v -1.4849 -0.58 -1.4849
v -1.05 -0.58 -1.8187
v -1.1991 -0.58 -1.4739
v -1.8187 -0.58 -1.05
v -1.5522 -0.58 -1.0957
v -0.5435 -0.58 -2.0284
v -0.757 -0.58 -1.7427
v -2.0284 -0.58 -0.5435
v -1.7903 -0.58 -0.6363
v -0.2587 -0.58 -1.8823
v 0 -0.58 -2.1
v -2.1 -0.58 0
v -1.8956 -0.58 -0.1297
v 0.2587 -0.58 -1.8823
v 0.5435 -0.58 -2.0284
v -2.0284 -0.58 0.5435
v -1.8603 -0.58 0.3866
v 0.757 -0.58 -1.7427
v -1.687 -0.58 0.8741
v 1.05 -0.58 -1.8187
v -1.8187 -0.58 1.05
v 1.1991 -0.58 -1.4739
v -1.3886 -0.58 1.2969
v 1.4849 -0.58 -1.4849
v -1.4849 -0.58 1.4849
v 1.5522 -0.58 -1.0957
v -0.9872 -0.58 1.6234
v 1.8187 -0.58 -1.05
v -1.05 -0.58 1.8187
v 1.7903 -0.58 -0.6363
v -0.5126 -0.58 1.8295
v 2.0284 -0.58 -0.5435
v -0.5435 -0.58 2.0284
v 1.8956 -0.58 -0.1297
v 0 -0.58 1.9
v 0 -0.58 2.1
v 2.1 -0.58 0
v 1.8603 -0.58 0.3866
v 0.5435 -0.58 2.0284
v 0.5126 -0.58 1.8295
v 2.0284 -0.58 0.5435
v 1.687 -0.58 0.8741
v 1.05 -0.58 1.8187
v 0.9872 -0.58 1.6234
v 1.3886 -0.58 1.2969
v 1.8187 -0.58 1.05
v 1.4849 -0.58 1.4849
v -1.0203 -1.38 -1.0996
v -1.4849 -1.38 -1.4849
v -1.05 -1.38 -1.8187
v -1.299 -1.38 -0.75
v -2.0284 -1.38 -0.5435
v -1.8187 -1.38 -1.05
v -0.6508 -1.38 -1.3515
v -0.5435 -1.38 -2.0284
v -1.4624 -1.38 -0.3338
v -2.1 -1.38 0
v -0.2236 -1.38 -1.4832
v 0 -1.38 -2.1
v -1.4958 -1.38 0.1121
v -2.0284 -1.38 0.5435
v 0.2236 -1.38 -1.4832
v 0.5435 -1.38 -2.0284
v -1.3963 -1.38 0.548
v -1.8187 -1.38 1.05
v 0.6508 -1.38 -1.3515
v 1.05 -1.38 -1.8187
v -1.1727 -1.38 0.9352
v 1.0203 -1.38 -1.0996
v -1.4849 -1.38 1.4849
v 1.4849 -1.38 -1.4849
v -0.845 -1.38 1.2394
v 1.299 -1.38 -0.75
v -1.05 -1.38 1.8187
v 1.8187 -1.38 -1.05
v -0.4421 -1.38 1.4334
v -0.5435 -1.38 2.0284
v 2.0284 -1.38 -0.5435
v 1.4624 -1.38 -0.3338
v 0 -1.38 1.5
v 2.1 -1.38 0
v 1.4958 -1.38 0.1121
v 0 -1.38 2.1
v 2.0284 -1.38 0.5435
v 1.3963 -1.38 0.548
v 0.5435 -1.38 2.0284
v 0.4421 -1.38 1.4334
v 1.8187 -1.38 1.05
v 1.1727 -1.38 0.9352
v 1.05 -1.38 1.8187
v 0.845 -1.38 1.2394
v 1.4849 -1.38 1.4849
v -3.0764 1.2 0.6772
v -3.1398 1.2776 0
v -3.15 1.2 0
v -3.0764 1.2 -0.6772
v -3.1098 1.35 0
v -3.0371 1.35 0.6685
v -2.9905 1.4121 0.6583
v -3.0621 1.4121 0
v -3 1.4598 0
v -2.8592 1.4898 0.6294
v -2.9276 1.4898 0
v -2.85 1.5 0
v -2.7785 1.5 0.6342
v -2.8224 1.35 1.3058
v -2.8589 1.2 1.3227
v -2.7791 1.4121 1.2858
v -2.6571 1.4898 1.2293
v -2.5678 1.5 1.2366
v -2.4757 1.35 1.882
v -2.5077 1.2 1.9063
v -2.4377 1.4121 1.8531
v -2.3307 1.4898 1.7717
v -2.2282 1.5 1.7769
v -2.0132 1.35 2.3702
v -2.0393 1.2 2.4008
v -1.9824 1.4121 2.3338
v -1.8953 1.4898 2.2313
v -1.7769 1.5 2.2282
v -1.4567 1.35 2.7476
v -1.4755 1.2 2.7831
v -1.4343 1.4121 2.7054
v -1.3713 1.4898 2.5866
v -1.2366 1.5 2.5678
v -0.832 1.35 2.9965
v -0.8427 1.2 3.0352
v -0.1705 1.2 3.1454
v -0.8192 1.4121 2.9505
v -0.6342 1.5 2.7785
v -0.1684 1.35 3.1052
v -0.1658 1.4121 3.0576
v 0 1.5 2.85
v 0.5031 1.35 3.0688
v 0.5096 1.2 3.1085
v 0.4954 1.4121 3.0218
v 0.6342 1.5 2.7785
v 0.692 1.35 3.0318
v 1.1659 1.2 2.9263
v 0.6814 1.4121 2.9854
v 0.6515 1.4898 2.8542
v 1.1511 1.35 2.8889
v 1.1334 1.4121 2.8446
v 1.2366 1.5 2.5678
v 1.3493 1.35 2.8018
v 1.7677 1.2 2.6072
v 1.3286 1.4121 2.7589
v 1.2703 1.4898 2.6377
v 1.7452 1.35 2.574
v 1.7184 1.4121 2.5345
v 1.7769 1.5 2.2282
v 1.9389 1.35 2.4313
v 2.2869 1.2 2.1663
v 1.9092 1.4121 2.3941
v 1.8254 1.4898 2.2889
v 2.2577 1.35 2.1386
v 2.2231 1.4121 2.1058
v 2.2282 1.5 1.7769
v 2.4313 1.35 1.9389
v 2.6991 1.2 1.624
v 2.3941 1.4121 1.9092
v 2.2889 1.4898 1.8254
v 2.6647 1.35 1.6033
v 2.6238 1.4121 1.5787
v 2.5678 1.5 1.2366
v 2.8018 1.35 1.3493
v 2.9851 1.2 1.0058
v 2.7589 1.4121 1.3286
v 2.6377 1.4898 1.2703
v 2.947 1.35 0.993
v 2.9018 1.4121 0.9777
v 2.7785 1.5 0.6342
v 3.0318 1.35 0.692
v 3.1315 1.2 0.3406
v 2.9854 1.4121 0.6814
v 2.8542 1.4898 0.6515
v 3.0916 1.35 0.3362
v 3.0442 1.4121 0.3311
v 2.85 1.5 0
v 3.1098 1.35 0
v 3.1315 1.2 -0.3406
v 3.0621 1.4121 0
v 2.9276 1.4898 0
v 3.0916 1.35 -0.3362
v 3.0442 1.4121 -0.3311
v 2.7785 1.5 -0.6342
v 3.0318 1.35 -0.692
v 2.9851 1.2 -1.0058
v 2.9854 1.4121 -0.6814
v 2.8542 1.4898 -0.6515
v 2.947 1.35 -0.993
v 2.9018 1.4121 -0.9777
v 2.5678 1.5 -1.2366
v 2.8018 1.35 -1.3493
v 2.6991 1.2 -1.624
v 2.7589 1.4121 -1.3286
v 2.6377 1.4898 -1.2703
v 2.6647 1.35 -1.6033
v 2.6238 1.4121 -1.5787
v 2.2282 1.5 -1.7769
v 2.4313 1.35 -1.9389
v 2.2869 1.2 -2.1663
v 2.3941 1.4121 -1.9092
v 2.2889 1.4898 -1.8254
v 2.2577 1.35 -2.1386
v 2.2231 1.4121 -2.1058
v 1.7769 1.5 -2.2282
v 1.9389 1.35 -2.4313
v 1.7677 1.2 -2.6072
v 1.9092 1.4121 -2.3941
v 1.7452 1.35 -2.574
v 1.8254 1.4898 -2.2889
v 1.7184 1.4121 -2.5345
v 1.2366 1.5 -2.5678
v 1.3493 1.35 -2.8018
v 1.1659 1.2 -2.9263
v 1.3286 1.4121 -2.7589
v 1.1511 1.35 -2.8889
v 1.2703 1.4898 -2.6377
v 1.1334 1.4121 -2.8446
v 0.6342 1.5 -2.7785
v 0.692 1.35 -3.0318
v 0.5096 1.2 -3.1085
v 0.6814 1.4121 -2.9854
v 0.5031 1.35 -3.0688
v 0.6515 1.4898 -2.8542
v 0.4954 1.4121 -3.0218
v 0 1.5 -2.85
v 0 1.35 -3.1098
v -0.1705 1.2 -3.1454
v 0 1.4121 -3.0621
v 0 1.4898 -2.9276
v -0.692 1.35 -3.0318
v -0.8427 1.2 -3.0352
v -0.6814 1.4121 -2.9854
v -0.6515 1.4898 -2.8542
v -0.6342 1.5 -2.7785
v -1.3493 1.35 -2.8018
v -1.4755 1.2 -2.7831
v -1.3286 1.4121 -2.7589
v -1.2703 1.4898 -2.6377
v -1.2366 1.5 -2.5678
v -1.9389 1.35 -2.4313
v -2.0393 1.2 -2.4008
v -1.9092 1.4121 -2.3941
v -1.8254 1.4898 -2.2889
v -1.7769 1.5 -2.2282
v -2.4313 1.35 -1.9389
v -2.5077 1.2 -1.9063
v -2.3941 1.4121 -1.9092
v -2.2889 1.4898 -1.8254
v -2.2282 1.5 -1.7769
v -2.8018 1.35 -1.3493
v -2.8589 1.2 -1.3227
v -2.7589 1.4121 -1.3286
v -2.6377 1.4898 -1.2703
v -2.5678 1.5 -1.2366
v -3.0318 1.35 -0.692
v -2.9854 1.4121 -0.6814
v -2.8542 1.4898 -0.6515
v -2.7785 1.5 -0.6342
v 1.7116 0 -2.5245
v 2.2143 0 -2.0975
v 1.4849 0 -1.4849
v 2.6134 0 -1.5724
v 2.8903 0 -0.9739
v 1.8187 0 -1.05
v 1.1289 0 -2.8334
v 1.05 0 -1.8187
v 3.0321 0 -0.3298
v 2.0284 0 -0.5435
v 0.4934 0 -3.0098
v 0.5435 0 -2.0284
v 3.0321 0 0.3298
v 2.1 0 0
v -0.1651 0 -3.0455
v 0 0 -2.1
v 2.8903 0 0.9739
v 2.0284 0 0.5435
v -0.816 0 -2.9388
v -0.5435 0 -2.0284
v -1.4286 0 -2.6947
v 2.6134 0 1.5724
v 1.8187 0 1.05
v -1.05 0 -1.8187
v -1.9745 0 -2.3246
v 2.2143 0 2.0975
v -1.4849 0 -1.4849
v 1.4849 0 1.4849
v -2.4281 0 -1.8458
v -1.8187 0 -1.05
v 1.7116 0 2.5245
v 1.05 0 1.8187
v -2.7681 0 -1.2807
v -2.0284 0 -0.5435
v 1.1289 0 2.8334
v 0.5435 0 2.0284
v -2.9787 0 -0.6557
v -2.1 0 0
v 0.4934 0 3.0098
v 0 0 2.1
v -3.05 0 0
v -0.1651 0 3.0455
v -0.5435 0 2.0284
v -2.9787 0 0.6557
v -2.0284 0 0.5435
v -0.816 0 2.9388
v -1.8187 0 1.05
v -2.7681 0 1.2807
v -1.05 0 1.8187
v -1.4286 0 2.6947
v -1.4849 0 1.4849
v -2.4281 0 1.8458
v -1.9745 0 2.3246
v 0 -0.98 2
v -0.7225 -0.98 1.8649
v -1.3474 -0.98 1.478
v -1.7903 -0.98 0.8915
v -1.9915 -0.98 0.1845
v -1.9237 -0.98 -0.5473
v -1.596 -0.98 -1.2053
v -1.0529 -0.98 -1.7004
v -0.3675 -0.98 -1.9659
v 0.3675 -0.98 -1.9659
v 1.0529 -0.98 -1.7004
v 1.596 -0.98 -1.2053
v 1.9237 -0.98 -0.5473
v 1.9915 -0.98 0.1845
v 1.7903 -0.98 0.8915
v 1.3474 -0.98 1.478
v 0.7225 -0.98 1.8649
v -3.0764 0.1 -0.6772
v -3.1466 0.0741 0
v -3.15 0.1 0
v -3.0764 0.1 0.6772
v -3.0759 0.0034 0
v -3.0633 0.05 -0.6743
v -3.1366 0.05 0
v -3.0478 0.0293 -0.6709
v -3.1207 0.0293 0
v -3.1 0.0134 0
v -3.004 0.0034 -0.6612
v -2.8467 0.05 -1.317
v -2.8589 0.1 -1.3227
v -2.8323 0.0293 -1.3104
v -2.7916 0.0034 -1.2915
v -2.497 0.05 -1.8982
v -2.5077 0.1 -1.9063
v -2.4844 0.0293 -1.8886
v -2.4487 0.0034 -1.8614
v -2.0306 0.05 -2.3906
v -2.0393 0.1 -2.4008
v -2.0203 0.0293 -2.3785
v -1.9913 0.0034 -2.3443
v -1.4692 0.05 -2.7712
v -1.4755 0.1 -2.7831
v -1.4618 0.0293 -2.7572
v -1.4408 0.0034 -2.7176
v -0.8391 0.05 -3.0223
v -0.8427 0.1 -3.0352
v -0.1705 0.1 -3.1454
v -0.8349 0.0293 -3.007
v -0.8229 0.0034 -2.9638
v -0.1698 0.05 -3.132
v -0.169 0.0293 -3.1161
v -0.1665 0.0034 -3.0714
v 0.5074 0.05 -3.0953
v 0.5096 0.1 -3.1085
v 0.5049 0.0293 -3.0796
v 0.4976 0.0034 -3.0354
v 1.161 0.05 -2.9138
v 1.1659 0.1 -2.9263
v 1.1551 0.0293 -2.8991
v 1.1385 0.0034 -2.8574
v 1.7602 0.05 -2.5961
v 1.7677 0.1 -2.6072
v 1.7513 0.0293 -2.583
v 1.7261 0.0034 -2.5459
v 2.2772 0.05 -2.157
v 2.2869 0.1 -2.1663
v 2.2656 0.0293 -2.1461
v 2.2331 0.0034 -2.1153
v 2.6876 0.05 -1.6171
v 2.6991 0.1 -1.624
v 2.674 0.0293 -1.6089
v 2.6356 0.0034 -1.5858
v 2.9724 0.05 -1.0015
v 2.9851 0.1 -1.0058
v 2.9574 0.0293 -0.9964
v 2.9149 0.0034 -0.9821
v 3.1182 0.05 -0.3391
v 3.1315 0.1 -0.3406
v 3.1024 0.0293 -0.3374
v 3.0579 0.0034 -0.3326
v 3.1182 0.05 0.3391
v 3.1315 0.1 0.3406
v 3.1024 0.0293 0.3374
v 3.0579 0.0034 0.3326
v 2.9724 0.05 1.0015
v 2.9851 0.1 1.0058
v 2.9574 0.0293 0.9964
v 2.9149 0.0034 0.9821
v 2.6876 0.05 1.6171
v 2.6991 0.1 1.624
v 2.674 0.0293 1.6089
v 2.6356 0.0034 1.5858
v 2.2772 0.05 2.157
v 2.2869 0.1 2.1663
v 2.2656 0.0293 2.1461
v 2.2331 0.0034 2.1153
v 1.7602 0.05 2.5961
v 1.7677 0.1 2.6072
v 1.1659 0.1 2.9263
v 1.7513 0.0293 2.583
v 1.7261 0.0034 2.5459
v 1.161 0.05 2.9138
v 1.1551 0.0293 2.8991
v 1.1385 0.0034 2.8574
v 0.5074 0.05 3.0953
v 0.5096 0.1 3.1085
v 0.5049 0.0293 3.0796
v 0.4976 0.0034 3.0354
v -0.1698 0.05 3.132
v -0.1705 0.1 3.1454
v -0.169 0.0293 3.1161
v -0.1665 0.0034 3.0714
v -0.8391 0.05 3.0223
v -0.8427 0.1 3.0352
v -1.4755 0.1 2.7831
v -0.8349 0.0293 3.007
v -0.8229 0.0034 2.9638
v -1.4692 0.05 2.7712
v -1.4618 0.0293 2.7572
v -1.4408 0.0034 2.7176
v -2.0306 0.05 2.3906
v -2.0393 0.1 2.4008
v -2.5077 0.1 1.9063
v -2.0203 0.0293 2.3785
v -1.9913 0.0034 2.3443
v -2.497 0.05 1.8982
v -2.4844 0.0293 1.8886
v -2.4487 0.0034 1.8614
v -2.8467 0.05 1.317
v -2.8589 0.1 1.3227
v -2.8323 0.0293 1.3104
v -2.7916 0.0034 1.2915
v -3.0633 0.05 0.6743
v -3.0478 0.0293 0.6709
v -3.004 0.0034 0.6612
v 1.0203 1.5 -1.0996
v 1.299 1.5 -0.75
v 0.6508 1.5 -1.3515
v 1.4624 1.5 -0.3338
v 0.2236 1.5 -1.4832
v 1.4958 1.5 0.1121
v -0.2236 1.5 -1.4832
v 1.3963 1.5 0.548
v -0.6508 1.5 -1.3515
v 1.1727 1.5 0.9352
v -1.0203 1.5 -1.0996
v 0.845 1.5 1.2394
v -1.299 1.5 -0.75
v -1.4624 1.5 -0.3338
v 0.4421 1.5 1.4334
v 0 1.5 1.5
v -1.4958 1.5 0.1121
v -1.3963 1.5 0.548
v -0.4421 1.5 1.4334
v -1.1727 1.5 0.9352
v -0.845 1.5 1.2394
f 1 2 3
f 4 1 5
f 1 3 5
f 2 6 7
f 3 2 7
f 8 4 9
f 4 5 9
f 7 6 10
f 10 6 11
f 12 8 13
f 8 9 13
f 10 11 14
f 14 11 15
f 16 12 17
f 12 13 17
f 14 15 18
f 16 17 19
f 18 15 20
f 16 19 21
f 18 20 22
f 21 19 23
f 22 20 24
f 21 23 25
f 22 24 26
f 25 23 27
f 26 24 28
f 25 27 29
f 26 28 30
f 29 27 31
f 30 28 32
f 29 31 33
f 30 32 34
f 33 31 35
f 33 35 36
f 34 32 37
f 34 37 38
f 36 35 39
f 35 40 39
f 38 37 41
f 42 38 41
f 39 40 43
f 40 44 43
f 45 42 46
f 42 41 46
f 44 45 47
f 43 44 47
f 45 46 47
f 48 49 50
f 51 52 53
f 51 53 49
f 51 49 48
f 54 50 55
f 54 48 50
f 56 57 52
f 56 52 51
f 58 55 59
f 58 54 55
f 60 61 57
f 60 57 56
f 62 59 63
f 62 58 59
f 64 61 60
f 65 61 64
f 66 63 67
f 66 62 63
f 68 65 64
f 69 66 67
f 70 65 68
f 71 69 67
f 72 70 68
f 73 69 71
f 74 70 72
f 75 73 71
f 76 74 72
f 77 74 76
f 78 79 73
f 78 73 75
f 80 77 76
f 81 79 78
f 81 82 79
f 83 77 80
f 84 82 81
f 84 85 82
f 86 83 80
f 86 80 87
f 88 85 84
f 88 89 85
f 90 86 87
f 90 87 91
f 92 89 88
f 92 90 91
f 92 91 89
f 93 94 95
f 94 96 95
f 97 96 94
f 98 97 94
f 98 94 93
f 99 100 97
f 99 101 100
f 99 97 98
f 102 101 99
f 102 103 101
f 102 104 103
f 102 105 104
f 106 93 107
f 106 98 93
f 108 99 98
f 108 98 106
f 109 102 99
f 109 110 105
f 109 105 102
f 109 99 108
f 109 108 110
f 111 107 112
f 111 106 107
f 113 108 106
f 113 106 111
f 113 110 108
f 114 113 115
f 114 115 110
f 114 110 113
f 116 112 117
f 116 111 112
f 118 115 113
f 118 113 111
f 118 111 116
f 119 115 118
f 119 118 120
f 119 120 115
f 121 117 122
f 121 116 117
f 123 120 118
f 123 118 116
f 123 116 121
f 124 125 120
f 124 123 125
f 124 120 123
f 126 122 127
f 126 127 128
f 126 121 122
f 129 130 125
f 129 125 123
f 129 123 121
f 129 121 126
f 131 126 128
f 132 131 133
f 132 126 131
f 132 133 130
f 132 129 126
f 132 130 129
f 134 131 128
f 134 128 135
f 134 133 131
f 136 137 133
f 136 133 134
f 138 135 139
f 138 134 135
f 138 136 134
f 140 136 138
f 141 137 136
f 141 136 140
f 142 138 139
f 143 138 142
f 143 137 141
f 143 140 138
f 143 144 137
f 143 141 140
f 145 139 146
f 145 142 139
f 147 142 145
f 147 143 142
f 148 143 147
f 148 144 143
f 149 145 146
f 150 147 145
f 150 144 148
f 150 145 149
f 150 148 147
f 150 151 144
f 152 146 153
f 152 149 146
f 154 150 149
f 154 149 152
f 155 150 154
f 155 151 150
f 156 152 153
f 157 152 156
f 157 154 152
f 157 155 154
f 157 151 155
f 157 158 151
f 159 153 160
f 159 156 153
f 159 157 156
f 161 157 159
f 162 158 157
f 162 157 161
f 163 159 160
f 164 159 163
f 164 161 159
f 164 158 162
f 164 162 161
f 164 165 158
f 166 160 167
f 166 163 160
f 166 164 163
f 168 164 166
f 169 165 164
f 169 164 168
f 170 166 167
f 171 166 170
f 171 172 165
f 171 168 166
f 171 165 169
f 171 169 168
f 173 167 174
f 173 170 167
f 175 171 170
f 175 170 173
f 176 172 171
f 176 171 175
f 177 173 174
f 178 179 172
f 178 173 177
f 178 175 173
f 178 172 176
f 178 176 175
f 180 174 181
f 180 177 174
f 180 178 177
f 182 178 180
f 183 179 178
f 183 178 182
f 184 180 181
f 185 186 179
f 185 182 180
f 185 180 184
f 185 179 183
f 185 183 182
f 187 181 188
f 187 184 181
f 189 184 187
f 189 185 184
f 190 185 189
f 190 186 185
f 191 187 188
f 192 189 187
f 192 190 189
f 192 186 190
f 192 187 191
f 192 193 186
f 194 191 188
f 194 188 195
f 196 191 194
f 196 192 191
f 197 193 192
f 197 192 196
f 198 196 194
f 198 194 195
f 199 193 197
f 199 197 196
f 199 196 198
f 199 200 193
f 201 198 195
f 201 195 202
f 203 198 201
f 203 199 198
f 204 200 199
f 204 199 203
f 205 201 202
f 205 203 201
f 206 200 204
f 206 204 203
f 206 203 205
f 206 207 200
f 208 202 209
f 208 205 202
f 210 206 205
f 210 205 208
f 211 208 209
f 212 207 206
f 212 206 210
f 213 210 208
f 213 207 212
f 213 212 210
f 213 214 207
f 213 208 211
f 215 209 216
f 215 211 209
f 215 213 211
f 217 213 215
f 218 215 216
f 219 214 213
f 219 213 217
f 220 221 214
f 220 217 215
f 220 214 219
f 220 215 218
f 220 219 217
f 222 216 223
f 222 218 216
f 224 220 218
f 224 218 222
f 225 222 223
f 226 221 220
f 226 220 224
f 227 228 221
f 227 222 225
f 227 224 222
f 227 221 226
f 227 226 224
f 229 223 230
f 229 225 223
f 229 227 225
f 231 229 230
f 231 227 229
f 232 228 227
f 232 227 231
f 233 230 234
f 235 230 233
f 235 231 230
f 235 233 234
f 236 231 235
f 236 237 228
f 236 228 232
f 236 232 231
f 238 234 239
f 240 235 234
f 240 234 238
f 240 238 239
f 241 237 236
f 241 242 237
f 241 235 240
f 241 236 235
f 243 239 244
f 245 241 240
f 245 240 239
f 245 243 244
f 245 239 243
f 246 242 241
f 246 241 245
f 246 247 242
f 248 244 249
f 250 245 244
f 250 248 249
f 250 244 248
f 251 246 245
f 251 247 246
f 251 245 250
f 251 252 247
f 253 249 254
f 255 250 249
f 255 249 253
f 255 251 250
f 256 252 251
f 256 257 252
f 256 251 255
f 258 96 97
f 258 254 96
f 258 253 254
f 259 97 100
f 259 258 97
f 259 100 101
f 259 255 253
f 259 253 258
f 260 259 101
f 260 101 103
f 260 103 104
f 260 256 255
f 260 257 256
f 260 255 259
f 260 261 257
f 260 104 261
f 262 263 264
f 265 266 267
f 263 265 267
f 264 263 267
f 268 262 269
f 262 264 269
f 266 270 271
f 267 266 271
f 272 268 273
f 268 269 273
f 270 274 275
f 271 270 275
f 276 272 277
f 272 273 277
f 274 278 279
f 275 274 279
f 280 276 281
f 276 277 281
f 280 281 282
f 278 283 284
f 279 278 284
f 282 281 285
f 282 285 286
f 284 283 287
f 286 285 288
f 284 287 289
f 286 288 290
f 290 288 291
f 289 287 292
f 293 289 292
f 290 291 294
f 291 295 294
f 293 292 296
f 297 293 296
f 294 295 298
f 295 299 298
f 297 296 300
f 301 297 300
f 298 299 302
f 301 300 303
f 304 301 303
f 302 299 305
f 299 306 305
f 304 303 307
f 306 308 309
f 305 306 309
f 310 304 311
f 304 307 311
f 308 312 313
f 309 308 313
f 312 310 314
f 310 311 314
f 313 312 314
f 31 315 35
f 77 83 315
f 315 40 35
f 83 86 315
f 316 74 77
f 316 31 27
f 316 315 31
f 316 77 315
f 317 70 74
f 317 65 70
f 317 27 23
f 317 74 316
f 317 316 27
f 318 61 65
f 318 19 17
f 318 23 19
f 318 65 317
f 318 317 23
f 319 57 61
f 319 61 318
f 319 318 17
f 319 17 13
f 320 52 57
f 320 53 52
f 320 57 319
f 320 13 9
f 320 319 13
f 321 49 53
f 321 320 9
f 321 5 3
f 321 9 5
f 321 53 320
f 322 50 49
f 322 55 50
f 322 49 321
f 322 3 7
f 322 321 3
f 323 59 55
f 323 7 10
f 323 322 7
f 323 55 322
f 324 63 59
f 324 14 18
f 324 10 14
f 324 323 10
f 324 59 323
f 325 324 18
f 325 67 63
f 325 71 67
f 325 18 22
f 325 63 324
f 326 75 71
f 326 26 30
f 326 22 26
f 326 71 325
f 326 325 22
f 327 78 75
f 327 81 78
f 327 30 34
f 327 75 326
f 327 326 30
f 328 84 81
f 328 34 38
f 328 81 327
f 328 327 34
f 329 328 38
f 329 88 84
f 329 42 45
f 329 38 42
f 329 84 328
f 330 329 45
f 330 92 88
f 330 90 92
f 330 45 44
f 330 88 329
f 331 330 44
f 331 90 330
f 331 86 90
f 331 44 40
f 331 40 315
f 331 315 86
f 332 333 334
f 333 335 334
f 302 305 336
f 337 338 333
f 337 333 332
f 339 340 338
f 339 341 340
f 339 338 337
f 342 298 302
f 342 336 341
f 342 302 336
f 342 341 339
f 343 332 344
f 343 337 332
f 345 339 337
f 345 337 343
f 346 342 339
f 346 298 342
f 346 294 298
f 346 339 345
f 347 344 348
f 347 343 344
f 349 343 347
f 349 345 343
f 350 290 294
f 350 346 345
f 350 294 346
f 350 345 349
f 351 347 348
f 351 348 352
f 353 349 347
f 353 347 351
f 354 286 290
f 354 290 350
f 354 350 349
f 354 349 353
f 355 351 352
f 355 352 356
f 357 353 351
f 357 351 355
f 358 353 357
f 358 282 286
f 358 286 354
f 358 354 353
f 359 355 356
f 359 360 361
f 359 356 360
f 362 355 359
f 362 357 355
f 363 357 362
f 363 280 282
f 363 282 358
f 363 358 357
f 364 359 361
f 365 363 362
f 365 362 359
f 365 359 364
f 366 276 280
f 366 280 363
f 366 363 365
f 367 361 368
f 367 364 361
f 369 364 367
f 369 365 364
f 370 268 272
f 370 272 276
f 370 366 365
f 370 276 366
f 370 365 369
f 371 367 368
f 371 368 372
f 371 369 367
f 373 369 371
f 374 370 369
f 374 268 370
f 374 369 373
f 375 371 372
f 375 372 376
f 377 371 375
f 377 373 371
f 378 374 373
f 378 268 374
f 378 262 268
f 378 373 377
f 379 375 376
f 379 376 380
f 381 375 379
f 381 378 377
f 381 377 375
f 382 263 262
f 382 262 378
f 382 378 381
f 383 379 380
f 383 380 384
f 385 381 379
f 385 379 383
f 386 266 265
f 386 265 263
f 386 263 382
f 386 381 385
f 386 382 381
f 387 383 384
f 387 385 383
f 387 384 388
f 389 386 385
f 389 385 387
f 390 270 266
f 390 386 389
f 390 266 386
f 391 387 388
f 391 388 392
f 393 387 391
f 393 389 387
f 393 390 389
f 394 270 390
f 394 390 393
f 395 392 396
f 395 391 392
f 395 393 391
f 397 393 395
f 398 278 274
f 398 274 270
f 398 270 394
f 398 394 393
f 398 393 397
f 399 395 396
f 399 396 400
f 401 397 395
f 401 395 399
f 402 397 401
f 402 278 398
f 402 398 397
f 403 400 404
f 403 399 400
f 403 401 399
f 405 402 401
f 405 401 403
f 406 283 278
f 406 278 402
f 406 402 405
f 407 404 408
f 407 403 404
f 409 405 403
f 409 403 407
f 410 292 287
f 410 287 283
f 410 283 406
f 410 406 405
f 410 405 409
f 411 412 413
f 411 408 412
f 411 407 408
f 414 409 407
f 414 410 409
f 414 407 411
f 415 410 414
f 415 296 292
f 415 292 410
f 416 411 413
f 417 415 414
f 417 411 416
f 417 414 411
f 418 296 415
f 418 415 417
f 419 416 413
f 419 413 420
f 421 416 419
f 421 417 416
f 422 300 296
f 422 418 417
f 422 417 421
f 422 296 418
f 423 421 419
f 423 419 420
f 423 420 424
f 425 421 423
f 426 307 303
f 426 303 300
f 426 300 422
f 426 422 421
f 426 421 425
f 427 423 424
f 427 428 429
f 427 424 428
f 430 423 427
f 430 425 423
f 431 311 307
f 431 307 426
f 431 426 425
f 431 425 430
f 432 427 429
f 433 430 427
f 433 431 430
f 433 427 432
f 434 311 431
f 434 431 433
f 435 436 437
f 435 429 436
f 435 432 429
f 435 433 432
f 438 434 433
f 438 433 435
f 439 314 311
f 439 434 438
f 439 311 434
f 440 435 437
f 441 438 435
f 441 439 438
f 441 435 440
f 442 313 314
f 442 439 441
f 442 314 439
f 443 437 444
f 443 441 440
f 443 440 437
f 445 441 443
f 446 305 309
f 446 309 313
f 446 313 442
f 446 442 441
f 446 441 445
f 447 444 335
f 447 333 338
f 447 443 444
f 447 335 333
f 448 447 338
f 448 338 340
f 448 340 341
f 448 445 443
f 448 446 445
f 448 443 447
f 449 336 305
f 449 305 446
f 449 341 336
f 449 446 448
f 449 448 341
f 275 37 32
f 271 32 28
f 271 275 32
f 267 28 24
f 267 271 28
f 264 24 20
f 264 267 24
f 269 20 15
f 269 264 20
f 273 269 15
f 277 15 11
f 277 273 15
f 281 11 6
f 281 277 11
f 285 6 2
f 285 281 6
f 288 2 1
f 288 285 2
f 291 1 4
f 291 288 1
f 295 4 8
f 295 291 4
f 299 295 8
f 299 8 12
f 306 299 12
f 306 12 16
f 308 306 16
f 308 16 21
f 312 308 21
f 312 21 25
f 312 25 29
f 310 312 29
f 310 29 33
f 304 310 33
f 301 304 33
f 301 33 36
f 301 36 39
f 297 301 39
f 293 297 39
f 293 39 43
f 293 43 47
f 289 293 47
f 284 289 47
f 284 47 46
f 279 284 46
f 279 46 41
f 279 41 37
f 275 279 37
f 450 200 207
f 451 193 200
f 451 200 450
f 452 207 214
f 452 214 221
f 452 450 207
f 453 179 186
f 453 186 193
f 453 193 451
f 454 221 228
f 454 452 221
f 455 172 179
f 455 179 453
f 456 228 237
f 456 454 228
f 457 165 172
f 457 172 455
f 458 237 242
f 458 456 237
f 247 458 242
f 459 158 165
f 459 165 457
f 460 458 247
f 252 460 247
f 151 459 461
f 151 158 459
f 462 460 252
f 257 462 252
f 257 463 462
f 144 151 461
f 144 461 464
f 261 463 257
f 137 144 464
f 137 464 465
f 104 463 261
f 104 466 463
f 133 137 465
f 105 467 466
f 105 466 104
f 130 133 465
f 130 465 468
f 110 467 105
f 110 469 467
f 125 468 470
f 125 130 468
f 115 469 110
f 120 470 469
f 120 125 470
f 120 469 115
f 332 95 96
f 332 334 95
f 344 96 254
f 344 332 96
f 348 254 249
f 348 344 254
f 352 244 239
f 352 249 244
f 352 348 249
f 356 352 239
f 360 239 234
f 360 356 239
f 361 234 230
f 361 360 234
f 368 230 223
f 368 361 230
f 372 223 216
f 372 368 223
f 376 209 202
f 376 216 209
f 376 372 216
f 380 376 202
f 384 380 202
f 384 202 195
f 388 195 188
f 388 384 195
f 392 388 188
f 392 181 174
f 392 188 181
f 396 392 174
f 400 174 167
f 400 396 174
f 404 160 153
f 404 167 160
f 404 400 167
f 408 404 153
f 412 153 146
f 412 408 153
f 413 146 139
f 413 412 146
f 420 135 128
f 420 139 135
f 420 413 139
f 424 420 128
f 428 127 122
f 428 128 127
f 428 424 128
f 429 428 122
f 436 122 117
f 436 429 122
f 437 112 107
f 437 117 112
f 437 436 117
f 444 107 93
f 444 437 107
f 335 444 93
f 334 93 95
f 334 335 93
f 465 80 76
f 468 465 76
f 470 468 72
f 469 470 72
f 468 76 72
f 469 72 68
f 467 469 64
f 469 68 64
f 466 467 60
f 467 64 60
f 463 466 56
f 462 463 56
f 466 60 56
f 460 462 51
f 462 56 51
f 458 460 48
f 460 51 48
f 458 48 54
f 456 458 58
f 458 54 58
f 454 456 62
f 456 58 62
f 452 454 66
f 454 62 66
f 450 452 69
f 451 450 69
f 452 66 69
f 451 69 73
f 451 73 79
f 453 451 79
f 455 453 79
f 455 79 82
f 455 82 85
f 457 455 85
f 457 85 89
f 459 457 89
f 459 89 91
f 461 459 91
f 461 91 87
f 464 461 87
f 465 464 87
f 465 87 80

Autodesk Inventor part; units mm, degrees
ref_plane "YZ Plane" through (0, 0, 0) normal (1, 0, 0) x (0, 1, 0)
ref_plane "XZ Plane" through (0, 0, 0) normal (0, 1, 0) x (-1, 0, 0)
ref_plane "XY Plane" through (0, 0, 0) normal (0, 0, 1) x (1, 0, 0)
sketch "スケッチ1" plane through (0, 0, 0) normal (0, 1, 0) x (-1, 0, 0)
  circle A0 centre (0, 0) radius 3.15
  dimension "d0" = 6.3
extrude "押し出し1" add sketch "スケッチ1" along normal blind 1.5
sketch "スケッチ2" plane through (0, 0, 0) normal (0, -1, 0) x (1, 0, 0)
  circle A0 centre (0, 0) radius 2.1
  dimension "d3" = 4.2
extrude "押し出し2" add sketch "スケッチ2" along normal blind 1.38
sketch "スケッチ3" plane through (0, 1.5, 0) normal (0, 1, 0) x (1, 0, 0)
  point P0 (0, 0)
  point P1 (0, 0)
hole "穴1" at (0, 1.5, 0) direction (0, -1, 0) diameter 3 end through all
thread "ねじ1" size "M3x0.5" class "6H" standard "ANSI Metric M Profile" full length
fillet "フィレット1" radius 0.3 1 edges at (3.15, 1.5, 0)
fillet "フィレット1" radius 0.1 1 edges at (3.15, 0, 0)
sketch "スケッチ4" plane through (0, 0, 0) normal (1, 0, 0) x (0, 1, 0)
  line L0 (-1.38, 2.1) -> (-1.38, -2.1) projected
  line L1 (-1.38, 2.1) -> (-0.58, 1.9)
  line L2 (-0.58, 1.9) -> (-0.58, 2.1)
  line L3 (-0.58, 2.1) -> (-1.38, 2.1)
  line L4 (-1.956, 0) -> (2.076, 0) projected
  point P0 (0, 0)
  dimension "d17" = 0.8
  dimension "d18" = 0.2
revolve "回転1" cut sketch "スケッチ4" angle 360 about axis through (0, -10, 0) along (0, 1, 0)
properties part number "ClinchingNut_M3T1.5_Slab1.4"
